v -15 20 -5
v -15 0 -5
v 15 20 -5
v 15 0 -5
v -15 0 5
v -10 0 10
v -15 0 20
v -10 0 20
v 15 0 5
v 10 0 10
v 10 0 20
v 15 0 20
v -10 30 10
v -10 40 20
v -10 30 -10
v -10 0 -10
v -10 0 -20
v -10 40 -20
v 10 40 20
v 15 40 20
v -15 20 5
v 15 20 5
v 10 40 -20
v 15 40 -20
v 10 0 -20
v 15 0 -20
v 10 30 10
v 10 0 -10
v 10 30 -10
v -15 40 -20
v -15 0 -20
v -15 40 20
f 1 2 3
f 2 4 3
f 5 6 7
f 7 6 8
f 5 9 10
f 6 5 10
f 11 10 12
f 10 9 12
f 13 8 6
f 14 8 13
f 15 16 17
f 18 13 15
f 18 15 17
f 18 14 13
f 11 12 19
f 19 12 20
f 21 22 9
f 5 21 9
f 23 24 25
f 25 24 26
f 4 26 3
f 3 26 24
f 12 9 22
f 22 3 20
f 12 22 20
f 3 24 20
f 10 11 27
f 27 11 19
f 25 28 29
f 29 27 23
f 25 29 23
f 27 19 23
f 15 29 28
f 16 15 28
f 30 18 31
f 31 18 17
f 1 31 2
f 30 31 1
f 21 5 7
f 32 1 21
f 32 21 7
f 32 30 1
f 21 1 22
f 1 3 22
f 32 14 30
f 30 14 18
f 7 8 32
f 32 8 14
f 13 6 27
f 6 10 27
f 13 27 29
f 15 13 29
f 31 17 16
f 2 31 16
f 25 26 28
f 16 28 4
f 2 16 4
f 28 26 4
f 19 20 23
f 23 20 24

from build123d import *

# Parameters (mm, degrees)
RESSALTO_EXTRUS_O1_DEPTH = 15
CORTE_EXTRUS_O1_DEPTH    = 10


with BuildPart() as part:
    # Esboço1 → Ressalto-extrusão1 (new body, symmetric)
    with BuildSketch(Plane(origin=(0, 0, 0), x_dir=(0, 0, -1), z_dir=(1, 0, 0))):
        Polygon((-20, 0), (-20, 40), (20, 40), (20, 0), (5, 0), (5, 20), (-5, 20), (-5, 0), align=None)
    extrude(amount=RESSALTO_EXTRUS_O1_DEPTH, both=True)

    # Esboço2 → Corte-extrusão1 (cut, symmetric)
    with BuildSketch(Plane(origin=(0, 0, 0), x_dir=(0, 0, -1), z_dir=(1, 0, 0))):
        Polygon((-10, 0), (-10, 30), (10, 30), (10, 0), (20, 0), (20, 40), (-20, 40), (-20, 0), align=None)
    extrude(amount=CORTE_EXTRUS_O1_DEPTH, both=True, mode=Mode.SUBTRACT)


solid = part.part
